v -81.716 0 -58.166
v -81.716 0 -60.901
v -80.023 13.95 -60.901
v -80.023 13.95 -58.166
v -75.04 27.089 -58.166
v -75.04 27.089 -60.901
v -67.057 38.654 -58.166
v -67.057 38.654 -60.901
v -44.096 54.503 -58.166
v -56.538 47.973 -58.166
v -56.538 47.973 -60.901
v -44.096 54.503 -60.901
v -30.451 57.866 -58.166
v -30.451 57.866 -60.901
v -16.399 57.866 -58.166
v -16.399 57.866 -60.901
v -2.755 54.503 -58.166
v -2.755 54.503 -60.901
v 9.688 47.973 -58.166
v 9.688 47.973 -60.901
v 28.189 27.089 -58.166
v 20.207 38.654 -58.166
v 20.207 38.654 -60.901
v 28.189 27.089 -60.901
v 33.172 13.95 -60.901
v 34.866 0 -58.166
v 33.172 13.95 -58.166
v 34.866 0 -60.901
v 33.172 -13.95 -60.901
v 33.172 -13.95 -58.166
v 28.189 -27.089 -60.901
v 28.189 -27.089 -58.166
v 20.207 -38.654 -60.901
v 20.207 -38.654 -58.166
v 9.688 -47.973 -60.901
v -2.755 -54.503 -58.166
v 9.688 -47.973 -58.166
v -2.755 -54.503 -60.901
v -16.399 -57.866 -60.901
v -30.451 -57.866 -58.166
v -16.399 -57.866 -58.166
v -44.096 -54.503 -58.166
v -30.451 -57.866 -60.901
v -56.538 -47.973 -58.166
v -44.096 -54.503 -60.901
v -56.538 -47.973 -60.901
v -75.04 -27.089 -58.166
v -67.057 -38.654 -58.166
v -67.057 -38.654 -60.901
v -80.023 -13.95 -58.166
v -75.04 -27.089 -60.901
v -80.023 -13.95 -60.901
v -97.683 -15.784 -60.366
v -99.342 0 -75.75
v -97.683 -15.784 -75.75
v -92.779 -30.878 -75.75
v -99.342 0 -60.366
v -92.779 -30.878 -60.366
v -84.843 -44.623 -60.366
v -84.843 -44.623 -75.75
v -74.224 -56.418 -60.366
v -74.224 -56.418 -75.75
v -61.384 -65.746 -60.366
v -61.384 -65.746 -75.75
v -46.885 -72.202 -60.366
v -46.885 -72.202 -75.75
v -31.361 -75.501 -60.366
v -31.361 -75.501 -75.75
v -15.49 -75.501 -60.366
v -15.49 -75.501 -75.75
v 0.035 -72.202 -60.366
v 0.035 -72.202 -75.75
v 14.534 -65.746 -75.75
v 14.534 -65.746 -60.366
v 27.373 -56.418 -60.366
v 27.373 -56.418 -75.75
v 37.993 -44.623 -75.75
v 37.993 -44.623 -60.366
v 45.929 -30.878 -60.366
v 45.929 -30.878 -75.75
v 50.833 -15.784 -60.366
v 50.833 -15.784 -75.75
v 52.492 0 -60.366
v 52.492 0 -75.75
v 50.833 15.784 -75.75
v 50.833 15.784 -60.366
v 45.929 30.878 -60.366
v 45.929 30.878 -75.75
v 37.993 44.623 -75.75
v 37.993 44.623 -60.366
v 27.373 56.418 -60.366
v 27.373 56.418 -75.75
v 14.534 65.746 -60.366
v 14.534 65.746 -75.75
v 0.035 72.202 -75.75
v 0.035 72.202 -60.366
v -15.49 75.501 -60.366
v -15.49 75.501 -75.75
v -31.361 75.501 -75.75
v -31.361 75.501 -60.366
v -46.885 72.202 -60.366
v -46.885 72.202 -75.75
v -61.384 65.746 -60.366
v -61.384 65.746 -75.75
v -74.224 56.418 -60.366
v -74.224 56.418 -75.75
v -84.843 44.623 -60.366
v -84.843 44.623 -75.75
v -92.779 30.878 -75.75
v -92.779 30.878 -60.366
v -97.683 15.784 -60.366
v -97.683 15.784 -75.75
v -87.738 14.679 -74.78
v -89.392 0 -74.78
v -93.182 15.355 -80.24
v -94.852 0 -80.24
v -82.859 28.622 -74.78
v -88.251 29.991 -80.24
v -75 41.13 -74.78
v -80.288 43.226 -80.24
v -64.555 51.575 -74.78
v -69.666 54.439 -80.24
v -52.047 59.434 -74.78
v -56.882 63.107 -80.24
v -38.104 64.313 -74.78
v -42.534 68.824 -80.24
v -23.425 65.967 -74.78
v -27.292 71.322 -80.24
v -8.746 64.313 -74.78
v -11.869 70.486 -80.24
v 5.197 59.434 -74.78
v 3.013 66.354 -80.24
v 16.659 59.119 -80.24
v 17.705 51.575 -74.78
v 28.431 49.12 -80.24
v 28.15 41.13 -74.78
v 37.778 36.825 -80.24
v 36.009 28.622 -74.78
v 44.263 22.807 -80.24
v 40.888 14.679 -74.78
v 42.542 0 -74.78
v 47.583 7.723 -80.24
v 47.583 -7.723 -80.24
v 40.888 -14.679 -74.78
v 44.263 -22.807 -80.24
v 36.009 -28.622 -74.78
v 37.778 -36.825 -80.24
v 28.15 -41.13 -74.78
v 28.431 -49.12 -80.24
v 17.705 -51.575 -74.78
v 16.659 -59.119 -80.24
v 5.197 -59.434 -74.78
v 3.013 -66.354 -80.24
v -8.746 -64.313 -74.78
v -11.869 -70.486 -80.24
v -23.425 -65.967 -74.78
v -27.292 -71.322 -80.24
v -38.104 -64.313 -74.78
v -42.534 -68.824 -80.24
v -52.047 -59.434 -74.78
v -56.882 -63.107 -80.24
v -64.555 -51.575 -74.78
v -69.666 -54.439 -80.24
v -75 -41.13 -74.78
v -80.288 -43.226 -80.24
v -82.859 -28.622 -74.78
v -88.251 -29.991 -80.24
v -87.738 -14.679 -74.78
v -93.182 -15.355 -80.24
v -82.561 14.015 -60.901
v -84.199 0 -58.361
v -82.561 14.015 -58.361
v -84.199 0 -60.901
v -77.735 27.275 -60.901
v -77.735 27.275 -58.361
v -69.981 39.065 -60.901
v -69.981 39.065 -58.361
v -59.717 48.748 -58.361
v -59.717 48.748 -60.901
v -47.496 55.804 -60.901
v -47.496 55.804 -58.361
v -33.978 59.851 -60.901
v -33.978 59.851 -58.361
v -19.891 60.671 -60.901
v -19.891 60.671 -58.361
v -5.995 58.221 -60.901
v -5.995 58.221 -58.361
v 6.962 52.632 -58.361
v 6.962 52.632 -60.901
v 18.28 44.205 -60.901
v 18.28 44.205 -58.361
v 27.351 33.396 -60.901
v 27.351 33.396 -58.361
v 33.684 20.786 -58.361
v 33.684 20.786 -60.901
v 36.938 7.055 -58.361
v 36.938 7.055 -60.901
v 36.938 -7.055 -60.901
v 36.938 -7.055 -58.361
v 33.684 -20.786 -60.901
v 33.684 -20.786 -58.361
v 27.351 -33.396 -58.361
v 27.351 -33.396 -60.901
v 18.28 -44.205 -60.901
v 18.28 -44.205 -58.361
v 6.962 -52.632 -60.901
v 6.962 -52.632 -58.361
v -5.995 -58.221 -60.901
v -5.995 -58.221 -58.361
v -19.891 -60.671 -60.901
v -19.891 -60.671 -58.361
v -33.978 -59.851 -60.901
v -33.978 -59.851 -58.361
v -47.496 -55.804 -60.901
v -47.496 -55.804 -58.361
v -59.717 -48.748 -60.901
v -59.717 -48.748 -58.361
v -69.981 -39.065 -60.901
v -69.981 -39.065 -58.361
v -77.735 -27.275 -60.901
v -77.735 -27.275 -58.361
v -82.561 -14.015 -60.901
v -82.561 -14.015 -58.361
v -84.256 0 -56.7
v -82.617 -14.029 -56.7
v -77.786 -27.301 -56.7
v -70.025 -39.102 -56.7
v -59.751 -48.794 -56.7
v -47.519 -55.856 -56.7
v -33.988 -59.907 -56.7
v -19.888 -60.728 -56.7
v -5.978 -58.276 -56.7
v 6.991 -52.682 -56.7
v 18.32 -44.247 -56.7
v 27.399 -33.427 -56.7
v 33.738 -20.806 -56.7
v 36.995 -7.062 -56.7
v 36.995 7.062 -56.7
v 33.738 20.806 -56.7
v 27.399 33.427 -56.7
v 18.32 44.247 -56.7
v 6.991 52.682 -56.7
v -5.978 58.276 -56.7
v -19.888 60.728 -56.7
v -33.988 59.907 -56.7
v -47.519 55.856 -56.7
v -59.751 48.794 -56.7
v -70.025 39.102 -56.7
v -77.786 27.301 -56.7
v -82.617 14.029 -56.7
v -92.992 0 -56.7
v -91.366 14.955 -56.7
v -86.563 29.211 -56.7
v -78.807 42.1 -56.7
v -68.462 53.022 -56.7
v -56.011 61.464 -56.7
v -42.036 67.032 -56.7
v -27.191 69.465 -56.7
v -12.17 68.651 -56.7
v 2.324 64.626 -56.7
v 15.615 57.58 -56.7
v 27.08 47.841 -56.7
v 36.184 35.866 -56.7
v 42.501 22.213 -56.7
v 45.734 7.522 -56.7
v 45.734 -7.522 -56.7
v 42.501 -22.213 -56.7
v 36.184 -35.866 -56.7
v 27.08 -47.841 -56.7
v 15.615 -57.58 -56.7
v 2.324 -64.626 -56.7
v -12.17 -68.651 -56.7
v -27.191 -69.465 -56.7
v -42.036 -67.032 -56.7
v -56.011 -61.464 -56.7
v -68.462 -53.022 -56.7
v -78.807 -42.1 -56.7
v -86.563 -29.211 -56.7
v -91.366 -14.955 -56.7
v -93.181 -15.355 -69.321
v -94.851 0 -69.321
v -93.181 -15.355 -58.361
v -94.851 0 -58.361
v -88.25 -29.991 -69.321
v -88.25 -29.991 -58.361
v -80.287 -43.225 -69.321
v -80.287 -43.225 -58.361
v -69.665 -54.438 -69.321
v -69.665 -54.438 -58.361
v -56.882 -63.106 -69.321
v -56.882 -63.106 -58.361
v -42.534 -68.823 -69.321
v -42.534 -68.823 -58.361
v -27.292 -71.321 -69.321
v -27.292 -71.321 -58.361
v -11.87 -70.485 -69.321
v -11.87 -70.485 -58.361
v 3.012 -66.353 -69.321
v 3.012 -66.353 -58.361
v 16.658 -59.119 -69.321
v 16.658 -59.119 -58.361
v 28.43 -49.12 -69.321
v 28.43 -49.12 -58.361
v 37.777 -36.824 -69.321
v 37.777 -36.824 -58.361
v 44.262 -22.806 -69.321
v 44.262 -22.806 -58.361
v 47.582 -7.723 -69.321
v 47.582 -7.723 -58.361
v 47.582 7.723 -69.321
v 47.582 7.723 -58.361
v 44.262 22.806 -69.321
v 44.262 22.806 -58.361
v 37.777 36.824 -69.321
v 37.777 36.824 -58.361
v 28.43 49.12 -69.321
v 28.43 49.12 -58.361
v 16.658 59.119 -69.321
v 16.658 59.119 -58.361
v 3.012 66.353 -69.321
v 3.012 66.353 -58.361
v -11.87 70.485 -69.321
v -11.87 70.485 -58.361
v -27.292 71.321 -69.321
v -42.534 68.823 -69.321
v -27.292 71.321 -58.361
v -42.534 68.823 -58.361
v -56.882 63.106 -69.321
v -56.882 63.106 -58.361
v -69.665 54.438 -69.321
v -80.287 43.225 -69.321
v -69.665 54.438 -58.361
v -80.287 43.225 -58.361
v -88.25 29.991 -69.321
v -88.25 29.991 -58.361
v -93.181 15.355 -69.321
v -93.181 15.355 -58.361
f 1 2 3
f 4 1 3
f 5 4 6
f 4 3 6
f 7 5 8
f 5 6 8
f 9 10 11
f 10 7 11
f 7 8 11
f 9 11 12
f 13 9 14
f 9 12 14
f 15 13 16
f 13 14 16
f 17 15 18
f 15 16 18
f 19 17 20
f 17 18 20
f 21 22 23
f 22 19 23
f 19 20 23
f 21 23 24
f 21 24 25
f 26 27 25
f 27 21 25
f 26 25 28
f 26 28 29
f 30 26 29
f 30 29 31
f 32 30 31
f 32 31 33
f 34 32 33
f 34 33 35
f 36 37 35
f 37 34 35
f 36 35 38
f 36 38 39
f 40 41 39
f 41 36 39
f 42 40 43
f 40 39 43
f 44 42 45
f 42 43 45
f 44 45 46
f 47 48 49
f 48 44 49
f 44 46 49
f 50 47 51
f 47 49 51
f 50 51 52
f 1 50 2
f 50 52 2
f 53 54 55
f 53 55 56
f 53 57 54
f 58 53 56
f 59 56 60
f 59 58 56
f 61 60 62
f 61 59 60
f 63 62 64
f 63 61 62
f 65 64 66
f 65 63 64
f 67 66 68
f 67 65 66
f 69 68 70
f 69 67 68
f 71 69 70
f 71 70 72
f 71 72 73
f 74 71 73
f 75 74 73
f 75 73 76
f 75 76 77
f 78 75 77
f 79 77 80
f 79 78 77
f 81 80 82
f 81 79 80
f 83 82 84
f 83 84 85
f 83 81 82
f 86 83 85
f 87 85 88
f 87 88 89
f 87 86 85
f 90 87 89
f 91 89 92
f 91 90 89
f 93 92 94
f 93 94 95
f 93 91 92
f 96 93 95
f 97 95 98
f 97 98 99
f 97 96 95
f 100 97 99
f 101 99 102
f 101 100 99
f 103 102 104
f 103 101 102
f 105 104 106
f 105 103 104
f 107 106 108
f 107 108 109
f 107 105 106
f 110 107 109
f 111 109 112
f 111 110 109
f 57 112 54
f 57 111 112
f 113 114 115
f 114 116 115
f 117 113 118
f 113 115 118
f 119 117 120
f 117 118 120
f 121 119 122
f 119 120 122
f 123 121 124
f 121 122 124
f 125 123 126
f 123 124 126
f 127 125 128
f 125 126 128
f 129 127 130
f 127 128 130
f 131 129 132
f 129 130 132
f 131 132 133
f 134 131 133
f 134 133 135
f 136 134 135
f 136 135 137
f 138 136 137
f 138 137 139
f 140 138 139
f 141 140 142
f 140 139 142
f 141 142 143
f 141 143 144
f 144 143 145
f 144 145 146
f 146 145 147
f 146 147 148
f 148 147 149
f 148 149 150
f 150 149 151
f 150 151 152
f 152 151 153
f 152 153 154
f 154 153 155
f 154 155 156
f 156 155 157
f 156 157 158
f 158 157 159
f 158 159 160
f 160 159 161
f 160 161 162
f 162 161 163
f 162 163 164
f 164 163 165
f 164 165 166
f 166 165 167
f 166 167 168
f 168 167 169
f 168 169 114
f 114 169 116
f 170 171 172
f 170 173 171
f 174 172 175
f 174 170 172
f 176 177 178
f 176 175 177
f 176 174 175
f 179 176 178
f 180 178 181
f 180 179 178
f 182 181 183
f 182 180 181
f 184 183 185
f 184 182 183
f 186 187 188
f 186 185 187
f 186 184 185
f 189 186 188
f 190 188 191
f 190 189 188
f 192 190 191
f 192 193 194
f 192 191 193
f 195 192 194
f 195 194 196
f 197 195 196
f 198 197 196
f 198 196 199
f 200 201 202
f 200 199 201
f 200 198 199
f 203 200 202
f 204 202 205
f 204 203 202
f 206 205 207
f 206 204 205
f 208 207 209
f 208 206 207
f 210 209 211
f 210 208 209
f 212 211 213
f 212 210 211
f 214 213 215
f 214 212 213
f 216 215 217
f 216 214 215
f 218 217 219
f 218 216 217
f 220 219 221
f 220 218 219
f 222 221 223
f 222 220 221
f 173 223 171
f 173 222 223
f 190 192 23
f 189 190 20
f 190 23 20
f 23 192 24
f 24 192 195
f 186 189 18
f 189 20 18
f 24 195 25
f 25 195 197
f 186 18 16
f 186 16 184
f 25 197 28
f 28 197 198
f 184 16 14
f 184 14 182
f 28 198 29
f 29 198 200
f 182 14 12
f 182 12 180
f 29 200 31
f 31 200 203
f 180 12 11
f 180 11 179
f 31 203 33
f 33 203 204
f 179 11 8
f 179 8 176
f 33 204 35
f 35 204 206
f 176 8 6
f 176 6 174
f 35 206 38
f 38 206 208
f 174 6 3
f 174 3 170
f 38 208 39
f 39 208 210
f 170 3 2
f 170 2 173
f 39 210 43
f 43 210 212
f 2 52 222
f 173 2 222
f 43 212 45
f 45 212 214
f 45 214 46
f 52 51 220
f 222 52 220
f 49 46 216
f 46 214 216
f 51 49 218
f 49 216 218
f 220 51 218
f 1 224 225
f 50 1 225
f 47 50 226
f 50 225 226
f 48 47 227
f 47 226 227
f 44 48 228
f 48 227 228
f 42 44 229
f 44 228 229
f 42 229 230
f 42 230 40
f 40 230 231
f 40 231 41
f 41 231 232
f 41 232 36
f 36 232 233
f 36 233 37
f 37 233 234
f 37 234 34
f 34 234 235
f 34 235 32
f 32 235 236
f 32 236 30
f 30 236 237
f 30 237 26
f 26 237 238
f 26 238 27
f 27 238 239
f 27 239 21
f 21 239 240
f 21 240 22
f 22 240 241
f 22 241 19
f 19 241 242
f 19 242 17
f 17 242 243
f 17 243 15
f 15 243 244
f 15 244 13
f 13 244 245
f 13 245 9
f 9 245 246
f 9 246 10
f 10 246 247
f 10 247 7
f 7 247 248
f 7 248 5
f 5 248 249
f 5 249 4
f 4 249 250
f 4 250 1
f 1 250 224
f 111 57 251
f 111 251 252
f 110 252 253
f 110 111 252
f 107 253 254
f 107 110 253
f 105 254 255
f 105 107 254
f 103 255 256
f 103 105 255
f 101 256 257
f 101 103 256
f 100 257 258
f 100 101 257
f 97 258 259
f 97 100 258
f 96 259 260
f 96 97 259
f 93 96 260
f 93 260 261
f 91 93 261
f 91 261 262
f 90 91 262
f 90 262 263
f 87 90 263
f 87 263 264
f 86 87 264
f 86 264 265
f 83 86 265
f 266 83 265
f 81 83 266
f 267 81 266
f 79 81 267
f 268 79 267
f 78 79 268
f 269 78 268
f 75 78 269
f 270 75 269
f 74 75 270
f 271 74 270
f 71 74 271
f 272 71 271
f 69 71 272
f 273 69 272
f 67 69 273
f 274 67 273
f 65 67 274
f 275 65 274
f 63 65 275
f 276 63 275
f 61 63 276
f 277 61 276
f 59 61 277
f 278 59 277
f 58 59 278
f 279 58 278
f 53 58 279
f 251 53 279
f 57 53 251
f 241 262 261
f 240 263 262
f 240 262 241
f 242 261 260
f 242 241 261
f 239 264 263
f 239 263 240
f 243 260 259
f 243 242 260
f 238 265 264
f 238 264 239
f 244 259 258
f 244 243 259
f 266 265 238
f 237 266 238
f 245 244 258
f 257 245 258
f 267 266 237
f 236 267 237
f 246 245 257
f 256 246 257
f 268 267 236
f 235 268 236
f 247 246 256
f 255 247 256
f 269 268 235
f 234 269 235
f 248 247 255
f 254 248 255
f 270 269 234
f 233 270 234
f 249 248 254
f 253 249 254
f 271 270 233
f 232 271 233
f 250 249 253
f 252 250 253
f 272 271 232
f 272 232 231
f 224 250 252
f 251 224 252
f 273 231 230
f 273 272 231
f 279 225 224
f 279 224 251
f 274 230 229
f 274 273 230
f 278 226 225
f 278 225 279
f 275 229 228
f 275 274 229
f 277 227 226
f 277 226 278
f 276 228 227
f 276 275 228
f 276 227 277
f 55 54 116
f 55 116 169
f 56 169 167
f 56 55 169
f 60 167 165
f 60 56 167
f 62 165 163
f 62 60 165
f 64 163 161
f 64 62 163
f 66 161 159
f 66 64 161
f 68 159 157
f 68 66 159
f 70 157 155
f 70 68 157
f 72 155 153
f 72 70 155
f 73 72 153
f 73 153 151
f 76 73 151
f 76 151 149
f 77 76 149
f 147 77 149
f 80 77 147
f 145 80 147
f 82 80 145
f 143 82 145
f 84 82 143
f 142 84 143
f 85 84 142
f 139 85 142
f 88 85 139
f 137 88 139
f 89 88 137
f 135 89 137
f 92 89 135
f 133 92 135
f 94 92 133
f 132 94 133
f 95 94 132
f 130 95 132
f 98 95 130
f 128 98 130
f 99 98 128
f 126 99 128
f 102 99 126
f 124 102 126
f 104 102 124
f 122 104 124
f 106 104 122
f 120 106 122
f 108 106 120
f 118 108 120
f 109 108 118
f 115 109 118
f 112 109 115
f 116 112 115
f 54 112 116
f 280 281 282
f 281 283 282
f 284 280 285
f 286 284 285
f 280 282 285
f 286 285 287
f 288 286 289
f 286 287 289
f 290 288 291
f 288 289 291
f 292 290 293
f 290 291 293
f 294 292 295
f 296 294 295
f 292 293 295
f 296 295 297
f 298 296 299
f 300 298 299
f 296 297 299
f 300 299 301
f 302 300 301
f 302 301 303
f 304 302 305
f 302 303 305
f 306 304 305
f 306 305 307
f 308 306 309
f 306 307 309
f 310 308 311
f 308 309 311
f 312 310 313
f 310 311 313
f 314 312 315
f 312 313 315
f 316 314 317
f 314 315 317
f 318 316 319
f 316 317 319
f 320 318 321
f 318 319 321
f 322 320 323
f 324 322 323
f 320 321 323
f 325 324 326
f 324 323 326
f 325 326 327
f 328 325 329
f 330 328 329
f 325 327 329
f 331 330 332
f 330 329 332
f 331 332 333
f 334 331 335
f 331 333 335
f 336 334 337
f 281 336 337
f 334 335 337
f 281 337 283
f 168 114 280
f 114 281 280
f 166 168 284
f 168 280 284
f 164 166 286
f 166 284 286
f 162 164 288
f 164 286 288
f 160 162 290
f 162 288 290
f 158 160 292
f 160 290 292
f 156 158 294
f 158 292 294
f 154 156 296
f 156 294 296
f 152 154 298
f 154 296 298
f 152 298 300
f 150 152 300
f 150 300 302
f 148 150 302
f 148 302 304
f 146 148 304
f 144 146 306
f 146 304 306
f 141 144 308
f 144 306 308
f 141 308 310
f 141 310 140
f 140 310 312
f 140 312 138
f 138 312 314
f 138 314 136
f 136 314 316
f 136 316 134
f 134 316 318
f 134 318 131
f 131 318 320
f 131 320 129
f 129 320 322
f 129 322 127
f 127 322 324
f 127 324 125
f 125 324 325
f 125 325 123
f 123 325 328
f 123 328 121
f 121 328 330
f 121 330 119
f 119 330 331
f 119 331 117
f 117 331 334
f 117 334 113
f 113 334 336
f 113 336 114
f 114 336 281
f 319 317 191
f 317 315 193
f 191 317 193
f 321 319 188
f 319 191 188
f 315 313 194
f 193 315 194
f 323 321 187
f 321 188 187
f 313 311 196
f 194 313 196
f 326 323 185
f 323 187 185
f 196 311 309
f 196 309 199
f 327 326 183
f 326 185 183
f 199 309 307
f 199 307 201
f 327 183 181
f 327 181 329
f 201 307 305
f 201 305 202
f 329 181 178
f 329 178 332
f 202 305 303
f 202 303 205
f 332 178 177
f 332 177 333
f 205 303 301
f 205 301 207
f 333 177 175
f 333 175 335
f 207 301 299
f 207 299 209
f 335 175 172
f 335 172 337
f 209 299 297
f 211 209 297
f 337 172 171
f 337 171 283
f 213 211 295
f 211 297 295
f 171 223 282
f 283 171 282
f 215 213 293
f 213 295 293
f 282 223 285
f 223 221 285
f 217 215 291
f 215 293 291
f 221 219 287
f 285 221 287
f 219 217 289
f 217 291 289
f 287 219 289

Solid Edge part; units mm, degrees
sketch "Sketch1" plane through (0, 0, 0) normal (0, -1, 0) x (1, 0, 0)
  line L0 (-99.3424, -56.6999) -> (-81.7165, -56.6999)
  line L1 (-81.7165, -56.6999) -> (-81.7165, -60.9006)
  line L2 (-84.199, -60.9006) -> (-81.7165, -60.9006)
  line L3 (-84.199, -58.3606) -> (-84.199, -60.9006)
  line L4 (-94.8512, -58.3606) -> (-84.199, -58.3606)
  line L5 (-94.8512, -69.321) -> (-94.8512, -58.3606)
  line L6 (-89.3922, -74.78) -> (-94.8512, -69.321)
  line L7 (-89.3922, -74.78) -> (-94.8522, -80.24)
  line L8 (-94.8522, -80.24) -> (-99.3424, -75.7499)
  line L9 (-99.3424, -75.7499) -> (-99.3424, -56.6999)
revolve "RevolvedProtrusion1" add sketch "Sketch1" angle 360 about axis through (-23.4251, 0, -63.5843) along (0, 0, 1)
chamfer "Chamfer_1" distance 6.35 angle 30 1 edges at (52.4921, 0, -56.6999) measured on face at (28.7048, 49.0932, -56.6999)
chamfer "Chamfer_2" distance 2.54 angle 30 1 edges at (34.8663, 0, -56.6999) measured on face at (24.3444, 44.9869, -56.6999)
